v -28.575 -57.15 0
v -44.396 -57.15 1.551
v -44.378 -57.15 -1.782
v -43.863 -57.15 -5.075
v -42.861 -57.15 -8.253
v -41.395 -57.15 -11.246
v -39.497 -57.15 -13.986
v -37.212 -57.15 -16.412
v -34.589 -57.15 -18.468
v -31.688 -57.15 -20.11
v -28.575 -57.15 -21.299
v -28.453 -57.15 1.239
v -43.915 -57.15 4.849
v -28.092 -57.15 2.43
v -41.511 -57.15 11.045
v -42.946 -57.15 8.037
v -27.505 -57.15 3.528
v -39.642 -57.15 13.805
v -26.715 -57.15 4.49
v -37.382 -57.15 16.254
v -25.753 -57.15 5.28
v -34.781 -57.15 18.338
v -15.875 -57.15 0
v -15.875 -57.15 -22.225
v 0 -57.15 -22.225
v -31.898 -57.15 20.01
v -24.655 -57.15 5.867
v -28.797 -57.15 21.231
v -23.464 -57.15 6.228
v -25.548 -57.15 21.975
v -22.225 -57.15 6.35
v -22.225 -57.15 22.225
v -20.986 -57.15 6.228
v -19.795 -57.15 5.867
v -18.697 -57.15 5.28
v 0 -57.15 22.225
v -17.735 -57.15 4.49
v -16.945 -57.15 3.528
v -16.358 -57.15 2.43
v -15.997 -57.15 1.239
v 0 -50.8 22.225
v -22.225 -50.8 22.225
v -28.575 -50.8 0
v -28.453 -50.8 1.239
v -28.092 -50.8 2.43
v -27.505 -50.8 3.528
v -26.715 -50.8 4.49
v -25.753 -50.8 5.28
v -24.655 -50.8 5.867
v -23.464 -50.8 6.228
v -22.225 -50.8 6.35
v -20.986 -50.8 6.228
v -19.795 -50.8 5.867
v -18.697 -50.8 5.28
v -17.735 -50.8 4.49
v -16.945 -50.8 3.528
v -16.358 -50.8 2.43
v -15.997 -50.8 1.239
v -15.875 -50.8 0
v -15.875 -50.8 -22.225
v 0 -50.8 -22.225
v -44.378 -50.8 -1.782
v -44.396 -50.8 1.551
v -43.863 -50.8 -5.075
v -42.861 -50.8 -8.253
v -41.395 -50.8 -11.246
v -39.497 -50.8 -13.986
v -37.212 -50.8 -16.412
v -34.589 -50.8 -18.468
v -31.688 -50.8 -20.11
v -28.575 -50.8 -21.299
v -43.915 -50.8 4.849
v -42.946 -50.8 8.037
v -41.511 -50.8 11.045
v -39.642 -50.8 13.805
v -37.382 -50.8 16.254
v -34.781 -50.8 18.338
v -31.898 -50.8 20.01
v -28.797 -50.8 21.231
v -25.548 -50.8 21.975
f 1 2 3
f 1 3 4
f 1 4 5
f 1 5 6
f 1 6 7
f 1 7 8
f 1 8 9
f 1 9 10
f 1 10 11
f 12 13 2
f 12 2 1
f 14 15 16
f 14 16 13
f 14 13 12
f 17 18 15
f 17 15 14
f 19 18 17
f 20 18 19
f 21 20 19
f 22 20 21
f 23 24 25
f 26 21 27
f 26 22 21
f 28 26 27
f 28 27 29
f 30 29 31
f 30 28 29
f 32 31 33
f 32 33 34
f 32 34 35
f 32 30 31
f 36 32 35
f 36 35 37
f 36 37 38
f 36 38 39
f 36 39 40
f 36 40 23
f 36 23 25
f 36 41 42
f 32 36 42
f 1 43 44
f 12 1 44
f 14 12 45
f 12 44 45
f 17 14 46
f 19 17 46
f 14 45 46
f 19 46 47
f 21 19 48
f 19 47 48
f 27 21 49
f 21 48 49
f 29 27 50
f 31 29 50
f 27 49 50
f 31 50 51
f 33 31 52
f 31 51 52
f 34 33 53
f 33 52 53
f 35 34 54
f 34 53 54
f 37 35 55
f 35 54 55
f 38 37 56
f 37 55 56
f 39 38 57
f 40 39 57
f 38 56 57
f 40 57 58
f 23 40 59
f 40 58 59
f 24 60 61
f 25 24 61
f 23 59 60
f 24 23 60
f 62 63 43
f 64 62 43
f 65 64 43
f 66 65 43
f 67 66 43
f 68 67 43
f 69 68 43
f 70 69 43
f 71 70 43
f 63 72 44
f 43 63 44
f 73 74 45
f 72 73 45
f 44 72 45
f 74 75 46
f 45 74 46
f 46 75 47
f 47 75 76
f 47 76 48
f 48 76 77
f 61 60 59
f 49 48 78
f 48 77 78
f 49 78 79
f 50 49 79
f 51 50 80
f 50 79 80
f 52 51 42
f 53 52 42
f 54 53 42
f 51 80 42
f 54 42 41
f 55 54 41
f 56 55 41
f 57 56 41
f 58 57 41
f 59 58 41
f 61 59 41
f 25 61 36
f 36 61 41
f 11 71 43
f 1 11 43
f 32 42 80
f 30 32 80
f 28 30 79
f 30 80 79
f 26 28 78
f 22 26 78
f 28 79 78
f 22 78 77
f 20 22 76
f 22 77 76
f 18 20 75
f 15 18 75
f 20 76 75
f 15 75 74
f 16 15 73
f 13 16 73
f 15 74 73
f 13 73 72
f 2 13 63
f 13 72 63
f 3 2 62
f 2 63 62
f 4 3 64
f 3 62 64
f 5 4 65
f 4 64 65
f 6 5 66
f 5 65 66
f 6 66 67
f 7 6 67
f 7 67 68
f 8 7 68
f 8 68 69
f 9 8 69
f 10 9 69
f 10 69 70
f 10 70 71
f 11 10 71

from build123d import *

# Parameters (mm, degrees)
F2_DEPTH = 6.35


# Not quite as in the source:
# - a feature of the source that left no trace in its solid (it failed there, or was rolled back) is left out
# - a feature names something its author has since deleted; it is built from what else it names


with BuildPart() as f2:
    # F0 (on Front) → F2 (new body)
    with BuildSketch(Plane.XZ):
        with BuildLine():
            Line((6.35, -22.225), (22.225, -22.225))
            Line((22.225, -22.225), (22.225, 22.225))
            Line((22.225, 22.225), (0, 22.225))
            ThreePointArc((0, 22.225), (-15.7154482119, 15.7154482119), (-22.225, 0))
            ThreePointArc((-22.225, 0), (-17.8196433045, -13.2819779212), (-6.35, -21.2985474857))
            Line((-6.35, -21.2985474857), (-6.35, 0))
            ThreePointArc((-6.35, 0), (0, 6.35), (6.35, 0))
            Line((6.35, 0), (6.35, -22.225))
        make_face()
    extrude(amount=F2_DEPTH)


with BuildPart() as f2_1:
    # F3: moved
    add(f2.part.moved(Location((-22.225, -50.8, 0))))


solid = f2_1.part
